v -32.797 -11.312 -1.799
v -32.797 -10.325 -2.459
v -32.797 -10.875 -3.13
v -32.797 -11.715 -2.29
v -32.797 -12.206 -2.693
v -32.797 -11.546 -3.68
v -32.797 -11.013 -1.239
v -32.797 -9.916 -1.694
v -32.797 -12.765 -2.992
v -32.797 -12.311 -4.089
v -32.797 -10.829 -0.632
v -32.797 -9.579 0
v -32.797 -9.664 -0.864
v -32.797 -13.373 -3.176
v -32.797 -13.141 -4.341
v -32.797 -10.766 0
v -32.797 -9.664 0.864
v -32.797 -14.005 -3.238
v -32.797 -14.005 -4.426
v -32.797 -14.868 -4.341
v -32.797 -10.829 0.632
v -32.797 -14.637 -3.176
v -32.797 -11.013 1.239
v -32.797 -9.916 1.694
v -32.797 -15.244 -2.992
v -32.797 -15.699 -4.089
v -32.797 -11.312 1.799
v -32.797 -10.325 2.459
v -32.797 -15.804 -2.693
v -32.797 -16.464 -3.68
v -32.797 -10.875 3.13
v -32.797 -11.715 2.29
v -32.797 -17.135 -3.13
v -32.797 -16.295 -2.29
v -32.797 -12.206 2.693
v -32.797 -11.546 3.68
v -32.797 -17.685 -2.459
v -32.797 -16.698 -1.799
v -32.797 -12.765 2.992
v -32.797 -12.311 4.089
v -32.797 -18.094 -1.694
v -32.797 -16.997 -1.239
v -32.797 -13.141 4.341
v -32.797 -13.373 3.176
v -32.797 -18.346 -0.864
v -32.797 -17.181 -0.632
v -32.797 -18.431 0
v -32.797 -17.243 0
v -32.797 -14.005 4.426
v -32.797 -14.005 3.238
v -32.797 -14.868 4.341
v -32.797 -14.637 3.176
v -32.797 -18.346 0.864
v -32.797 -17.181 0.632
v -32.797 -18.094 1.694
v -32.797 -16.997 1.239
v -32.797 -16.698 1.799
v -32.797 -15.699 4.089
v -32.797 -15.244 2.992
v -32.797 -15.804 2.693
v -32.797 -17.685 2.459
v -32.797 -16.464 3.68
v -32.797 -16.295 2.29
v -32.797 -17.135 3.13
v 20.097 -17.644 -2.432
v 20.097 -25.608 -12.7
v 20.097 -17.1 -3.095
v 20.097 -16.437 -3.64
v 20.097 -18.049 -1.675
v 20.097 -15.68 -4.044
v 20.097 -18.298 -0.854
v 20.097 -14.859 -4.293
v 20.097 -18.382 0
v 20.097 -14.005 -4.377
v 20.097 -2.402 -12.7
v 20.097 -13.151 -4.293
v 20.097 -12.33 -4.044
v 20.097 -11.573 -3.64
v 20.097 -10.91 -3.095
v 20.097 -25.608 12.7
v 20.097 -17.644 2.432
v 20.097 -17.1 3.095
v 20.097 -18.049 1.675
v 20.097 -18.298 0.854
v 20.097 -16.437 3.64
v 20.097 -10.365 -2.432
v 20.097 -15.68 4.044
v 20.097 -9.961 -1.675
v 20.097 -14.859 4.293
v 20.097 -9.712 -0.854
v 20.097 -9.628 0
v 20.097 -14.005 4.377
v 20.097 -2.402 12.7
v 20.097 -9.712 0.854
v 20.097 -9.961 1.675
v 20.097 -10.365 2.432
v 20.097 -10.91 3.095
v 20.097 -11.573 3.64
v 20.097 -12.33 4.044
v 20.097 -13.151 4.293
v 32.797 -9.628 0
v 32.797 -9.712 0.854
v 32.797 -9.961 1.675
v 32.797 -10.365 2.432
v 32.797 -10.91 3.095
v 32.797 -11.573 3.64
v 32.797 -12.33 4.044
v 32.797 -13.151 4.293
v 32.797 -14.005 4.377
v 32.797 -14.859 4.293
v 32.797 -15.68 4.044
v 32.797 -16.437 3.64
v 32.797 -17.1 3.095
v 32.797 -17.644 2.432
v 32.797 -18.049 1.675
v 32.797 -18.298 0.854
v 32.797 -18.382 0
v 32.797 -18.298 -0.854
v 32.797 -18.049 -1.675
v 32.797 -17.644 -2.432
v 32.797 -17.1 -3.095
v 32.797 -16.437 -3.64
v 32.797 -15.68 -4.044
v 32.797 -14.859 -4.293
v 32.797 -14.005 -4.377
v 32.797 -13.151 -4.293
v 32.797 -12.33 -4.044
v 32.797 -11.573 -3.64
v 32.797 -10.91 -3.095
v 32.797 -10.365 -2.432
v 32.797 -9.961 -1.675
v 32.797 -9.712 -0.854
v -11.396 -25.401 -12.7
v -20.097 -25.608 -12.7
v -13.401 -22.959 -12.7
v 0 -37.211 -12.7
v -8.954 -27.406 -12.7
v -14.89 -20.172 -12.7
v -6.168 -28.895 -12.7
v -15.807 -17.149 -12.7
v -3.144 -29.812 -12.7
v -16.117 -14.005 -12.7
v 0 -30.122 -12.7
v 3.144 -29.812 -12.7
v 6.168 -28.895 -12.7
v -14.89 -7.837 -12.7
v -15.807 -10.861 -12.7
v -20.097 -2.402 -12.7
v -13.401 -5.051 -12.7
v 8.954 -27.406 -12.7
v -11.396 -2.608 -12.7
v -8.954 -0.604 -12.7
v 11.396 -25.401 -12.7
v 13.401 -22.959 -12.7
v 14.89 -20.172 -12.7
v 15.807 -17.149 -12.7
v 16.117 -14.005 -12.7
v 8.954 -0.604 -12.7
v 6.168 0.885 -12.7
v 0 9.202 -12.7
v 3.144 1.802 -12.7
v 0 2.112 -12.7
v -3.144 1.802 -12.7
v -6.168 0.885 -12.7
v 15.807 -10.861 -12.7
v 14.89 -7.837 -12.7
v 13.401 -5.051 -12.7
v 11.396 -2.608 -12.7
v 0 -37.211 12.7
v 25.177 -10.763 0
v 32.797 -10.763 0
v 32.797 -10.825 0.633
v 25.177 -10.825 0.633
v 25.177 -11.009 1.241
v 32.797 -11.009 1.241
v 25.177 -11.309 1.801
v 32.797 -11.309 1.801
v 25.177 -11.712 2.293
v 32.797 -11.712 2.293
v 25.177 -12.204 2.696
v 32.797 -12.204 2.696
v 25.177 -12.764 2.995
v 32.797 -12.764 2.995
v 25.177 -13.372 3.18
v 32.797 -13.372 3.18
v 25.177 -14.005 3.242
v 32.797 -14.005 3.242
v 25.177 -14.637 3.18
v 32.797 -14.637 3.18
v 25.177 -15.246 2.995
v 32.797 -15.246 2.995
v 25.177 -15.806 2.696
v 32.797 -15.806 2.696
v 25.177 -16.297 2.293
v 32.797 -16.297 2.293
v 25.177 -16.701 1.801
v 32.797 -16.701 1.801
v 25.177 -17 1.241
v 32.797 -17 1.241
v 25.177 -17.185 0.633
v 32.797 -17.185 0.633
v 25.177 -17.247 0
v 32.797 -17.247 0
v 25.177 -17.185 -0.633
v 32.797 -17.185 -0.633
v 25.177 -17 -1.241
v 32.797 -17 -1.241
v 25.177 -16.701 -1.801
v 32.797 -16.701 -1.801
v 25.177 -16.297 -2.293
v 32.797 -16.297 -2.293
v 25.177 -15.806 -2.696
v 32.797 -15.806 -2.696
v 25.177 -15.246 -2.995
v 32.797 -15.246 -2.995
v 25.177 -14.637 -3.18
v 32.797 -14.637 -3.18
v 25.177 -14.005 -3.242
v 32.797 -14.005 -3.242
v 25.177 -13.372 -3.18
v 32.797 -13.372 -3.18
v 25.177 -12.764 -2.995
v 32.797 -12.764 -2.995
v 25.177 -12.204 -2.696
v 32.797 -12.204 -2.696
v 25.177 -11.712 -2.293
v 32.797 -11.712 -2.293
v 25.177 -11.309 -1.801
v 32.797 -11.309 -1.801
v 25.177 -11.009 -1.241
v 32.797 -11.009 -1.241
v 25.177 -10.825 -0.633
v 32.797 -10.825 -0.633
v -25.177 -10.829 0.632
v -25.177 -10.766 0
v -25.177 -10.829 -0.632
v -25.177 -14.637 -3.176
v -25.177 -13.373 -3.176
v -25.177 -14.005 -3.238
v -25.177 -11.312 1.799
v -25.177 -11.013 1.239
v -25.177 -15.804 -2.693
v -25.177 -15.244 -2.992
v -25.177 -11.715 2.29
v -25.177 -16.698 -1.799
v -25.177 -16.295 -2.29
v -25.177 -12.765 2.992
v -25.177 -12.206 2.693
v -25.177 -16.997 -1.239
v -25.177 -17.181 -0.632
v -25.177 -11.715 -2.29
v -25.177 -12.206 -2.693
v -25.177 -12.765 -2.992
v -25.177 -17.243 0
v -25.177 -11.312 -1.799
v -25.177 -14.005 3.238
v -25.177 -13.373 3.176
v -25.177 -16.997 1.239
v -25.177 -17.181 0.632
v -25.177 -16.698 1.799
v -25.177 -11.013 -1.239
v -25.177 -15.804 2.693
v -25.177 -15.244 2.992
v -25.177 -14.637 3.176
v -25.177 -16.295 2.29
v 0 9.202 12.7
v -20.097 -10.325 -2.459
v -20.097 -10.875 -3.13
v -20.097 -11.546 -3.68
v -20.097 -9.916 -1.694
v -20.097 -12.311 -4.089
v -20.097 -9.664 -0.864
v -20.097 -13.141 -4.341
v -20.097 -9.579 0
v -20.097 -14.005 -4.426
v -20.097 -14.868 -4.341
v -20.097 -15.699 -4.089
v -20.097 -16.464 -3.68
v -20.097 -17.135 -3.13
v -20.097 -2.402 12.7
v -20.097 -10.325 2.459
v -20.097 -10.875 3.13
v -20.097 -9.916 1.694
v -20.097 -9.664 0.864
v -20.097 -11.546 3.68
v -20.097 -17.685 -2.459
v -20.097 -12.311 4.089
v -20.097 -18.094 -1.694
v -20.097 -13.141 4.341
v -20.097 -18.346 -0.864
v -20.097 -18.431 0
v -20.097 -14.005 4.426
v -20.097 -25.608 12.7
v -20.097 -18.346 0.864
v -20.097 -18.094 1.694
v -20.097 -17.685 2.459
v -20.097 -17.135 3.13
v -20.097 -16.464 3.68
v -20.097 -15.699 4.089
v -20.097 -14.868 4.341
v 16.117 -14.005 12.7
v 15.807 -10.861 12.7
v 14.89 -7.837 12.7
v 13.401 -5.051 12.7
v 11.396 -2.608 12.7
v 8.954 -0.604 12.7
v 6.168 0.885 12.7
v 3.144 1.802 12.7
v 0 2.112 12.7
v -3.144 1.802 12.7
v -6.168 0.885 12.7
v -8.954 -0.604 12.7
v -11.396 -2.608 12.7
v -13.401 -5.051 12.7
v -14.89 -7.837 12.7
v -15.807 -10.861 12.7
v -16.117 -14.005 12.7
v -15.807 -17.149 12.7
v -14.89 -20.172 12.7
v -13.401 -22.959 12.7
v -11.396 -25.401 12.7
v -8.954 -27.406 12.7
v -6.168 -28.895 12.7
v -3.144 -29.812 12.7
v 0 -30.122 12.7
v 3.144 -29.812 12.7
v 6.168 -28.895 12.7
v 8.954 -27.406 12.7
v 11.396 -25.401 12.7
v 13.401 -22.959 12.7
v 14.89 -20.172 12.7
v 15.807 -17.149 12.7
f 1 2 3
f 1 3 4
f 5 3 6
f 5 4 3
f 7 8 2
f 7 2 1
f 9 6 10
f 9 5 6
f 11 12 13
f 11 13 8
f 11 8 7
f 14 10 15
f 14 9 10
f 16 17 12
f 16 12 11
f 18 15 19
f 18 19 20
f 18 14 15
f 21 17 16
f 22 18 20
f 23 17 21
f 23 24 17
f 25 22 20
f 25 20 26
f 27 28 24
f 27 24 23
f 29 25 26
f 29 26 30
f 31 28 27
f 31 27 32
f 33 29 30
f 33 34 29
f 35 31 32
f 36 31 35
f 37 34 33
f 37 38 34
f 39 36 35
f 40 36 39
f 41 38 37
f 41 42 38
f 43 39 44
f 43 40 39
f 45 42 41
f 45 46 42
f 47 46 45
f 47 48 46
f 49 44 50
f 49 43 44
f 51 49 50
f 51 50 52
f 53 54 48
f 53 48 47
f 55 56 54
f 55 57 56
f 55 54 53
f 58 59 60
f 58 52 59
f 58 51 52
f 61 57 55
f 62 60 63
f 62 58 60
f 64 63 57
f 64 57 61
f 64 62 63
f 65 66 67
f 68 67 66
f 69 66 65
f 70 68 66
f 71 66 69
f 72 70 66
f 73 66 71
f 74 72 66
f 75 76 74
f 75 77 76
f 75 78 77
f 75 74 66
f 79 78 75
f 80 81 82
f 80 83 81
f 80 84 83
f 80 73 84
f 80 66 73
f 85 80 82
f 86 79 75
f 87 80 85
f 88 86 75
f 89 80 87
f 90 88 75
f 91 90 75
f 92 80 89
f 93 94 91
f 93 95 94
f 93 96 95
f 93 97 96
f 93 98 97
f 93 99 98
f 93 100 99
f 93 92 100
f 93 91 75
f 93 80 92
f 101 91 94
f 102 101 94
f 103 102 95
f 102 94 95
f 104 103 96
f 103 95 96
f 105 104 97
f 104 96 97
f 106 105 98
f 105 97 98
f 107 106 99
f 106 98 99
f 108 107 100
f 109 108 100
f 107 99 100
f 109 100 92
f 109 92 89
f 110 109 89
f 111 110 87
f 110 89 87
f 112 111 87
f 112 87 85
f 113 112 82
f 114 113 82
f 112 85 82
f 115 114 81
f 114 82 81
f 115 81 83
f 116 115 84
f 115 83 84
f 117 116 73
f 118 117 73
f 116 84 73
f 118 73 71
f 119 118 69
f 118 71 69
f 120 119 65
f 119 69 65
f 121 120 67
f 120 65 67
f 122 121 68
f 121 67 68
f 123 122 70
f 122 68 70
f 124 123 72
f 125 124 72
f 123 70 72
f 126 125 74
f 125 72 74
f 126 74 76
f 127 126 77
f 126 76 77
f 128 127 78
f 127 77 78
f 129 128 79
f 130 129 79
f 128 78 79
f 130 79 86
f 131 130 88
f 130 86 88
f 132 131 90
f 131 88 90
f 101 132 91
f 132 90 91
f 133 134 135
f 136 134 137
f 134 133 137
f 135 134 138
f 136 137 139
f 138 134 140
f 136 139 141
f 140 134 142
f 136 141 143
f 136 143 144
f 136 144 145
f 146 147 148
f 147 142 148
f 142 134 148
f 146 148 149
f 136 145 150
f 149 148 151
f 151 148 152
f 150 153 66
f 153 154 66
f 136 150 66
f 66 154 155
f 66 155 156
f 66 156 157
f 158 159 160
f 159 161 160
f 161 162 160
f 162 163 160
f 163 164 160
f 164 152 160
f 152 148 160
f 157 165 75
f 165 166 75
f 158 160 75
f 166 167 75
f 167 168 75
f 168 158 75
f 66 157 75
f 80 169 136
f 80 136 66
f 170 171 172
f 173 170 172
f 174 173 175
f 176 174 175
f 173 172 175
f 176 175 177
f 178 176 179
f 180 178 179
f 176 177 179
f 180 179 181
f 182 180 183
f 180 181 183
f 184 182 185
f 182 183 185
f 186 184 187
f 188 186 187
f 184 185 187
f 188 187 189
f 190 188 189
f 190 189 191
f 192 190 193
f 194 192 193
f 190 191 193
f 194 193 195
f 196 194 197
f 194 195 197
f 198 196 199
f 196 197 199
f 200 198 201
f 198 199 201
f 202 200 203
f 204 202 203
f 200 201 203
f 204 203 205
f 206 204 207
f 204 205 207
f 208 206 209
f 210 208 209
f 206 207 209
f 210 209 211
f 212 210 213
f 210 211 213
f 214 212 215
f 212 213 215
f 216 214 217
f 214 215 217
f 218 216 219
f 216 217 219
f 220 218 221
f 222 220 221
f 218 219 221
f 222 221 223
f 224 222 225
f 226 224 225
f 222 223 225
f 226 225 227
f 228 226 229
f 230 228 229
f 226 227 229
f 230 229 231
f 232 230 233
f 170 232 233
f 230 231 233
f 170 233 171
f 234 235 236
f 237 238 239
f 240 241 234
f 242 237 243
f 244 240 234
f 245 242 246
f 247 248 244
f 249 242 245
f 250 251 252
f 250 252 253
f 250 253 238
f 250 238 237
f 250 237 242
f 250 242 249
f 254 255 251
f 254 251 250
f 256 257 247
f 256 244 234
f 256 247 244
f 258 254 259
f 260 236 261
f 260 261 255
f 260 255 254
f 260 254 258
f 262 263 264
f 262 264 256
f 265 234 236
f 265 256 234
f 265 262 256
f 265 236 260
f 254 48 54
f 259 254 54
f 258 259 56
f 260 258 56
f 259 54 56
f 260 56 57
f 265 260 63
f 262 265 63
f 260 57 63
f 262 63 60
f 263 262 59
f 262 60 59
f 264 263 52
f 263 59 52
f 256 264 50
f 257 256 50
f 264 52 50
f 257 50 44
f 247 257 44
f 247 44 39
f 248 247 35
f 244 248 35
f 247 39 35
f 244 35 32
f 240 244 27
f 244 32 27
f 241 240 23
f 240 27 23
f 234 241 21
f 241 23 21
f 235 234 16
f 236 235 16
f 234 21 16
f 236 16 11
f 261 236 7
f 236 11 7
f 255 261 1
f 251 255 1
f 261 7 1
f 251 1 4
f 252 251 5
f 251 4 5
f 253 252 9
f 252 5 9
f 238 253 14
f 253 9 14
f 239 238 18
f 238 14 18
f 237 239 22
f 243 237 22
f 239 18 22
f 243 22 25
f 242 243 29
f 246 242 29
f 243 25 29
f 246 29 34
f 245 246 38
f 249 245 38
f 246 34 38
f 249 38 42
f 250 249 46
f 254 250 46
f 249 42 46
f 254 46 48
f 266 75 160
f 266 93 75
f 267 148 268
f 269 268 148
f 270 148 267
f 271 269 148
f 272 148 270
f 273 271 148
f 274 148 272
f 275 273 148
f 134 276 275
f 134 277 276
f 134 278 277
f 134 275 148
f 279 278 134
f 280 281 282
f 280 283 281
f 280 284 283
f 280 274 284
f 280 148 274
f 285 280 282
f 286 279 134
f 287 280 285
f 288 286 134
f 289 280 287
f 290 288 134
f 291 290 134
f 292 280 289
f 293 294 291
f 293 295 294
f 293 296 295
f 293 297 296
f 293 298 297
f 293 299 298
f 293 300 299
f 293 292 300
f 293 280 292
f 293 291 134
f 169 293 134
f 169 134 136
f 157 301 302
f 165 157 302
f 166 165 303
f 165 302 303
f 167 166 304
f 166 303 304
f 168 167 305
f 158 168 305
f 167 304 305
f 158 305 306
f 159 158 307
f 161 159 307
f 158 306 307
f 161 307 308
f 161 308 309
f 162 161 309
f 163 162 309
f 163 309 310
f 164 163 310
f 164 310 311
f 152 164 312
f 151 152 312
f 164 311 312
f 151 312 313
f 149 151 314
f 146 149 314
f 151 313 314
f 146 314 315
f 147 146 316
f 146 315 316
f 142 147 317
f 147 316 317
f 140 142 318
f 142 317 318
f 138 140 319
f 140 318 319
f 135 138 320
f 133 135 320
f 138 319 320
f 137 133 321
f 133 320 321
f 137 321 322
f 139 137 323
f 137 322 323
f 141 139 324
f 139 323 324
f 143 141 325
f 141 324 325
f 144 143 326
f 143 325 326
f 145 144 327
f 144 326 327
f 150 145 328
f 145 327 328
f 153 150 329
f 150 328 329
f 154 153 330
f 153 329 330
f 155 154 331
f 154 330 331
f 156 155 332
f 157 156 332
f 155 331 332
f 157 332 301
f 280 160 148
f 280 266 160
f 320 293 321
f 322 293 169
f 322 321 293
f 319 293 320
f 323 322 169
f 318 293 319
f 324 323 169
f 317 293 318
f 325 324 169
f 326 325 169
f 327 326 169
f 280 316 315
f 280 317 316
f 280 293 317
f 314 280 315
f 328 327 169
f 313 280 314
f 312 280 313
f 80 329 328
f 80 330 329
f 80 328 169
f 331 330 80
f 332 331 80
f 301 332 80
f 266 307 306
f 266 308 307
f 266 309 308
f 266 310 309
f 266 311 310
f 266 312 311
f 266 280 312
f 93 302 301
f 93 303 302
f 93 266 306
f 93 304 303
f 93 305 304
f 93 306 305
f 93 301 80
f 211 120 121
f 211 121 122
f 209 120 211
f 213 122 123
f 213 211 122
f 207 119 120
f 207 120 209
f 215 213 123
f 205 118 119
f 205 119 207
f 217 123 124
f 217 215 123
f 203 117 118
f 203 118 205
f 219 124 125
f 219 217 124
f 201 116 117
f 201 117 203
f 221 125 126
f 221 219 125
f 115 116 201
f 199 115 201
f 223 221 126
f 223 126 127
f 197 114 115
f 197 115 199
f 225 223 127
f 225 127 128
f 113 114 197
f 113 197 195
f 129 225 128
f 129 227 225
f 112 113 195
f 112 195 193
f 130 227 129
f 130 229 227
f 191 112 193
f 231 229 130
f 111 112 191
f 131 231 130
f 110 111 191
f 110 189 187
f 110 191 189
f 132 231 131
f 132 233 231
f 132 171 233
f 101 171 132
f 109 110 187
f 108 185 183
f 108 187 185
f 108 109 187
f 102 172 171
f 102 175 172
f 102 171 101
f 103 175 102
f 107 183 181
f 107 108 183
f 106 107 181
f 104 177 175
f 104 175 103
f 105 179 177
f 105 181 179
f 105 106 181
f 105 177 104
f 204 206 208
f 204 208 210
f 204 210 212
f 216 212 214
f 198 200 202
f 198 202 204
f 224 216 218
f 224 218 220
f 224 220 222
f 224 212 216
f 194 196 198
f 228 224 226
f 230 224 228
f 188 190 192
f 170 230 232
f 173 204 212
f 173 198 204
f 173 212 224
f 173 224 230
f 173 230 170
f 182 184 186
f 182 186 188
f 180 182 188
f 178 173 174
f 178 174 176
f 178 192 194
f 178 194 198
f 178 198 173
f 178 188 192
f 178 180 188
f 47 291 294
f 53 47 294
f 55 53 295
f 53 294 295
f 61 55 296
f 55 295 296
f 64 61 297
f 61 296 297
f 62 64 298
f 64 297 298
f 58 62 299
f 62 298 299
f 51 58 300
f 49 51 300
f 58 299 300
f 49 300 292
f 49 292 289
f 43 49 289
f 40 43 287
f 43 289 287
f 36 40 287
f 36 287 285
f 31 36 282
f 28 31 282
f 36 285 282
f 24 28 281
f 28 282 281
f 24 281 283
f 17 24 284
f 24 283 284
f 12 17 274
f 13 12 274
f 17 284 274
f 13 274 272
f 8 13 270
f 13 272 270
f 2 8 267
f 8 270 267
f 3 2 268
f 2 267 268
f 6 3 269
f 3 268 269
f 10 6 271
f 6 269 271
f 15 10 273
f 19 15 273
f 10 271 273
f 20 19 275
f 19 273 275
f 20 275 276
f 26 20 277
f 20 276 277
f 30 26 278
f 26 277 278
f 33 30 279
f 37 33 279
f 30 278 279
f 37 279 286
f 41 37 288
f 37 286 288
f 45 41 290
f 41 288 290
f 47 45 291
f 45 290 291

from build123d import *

# Parameters (mm, degrees)
F1_DEPTH  = 12.7
F2_R      = 16.11687381
F3_DEPTH  = 25.4
F4_R      = 4.4261898193
F5_DEPTH  = 12.7
F6_R      = 4.3771900823
F7_DEPTH  = 12.7
F8_R      = 3.2385
F9_DEPTH  = 7.62
F10_R     = 3.2422174322
F11_DEPTH = 7.62


with BuildPart() as f1:
    # F0 (on Top) → F1 (new body, symmetric)
    with BuildSketch(Plane.XY):
        Polygon((-20.0972985476, -2.401636506), (-20.0972985476, -25.6079979589), (0, -37.2111786854), (20.0972985476, -25.6079979589), (20.0972985476, -2.401636506), (0, 9.2015442204), align=None)
    extrude(amount=F1_DEPTH, both=True)

    # F2 (on face) → F3 (cut)
    with BuildSketch(Plane.XY.offset(12.7)):
        with Locations((0, -14.0048172325)):
            Circle(F2_R)
    extrude(amount=-F3_DEPTH, mode=Mode.SUBTRACT)

    # F4 (on face) → F5 (join)
    with BuildSketch(Plane(origin=(-20.0972985476, 0, 0), x_dir=(0, -1, 0), z_dir=(-1, 0, 0))):
        with Locations((14.0048172325, 0)):
            Circle(F4_R)
    extrude(amount=F5_DEPTH)

    # F6 (on face) → F7 (join)
    with BuildSketch(Plane.YZ.offset(20.0972985476)):
        with Locations((-14.0048172325, 0)):
            Circle(F6_R)
    extrude(amount=F7_DEPTH)

    # F8 (on face) → F9 (cut)
    with BuildSketch(Plane(origin=(-32.7972985476, 0, 0), x_dir=(0, -1, 0), z_dir=(-1, 0, 0))):
        with Locations((14.0048172325, 0)):
            Circle(F8_R)
    extrude(amount=-F9_DEPTH, mode=Mode.SUBTRACT)

    # F10 (on face) → F11 (cut)
    with BuildSketch(Plane.YZ.offset(32.7972985476)):
        with Locations((-14.0048172325, 0)):
            Circle(F10_R)
    extrude(amount=-F11_DEPTH, mode=Mode.SUBTRACT)


solid = f1.part
